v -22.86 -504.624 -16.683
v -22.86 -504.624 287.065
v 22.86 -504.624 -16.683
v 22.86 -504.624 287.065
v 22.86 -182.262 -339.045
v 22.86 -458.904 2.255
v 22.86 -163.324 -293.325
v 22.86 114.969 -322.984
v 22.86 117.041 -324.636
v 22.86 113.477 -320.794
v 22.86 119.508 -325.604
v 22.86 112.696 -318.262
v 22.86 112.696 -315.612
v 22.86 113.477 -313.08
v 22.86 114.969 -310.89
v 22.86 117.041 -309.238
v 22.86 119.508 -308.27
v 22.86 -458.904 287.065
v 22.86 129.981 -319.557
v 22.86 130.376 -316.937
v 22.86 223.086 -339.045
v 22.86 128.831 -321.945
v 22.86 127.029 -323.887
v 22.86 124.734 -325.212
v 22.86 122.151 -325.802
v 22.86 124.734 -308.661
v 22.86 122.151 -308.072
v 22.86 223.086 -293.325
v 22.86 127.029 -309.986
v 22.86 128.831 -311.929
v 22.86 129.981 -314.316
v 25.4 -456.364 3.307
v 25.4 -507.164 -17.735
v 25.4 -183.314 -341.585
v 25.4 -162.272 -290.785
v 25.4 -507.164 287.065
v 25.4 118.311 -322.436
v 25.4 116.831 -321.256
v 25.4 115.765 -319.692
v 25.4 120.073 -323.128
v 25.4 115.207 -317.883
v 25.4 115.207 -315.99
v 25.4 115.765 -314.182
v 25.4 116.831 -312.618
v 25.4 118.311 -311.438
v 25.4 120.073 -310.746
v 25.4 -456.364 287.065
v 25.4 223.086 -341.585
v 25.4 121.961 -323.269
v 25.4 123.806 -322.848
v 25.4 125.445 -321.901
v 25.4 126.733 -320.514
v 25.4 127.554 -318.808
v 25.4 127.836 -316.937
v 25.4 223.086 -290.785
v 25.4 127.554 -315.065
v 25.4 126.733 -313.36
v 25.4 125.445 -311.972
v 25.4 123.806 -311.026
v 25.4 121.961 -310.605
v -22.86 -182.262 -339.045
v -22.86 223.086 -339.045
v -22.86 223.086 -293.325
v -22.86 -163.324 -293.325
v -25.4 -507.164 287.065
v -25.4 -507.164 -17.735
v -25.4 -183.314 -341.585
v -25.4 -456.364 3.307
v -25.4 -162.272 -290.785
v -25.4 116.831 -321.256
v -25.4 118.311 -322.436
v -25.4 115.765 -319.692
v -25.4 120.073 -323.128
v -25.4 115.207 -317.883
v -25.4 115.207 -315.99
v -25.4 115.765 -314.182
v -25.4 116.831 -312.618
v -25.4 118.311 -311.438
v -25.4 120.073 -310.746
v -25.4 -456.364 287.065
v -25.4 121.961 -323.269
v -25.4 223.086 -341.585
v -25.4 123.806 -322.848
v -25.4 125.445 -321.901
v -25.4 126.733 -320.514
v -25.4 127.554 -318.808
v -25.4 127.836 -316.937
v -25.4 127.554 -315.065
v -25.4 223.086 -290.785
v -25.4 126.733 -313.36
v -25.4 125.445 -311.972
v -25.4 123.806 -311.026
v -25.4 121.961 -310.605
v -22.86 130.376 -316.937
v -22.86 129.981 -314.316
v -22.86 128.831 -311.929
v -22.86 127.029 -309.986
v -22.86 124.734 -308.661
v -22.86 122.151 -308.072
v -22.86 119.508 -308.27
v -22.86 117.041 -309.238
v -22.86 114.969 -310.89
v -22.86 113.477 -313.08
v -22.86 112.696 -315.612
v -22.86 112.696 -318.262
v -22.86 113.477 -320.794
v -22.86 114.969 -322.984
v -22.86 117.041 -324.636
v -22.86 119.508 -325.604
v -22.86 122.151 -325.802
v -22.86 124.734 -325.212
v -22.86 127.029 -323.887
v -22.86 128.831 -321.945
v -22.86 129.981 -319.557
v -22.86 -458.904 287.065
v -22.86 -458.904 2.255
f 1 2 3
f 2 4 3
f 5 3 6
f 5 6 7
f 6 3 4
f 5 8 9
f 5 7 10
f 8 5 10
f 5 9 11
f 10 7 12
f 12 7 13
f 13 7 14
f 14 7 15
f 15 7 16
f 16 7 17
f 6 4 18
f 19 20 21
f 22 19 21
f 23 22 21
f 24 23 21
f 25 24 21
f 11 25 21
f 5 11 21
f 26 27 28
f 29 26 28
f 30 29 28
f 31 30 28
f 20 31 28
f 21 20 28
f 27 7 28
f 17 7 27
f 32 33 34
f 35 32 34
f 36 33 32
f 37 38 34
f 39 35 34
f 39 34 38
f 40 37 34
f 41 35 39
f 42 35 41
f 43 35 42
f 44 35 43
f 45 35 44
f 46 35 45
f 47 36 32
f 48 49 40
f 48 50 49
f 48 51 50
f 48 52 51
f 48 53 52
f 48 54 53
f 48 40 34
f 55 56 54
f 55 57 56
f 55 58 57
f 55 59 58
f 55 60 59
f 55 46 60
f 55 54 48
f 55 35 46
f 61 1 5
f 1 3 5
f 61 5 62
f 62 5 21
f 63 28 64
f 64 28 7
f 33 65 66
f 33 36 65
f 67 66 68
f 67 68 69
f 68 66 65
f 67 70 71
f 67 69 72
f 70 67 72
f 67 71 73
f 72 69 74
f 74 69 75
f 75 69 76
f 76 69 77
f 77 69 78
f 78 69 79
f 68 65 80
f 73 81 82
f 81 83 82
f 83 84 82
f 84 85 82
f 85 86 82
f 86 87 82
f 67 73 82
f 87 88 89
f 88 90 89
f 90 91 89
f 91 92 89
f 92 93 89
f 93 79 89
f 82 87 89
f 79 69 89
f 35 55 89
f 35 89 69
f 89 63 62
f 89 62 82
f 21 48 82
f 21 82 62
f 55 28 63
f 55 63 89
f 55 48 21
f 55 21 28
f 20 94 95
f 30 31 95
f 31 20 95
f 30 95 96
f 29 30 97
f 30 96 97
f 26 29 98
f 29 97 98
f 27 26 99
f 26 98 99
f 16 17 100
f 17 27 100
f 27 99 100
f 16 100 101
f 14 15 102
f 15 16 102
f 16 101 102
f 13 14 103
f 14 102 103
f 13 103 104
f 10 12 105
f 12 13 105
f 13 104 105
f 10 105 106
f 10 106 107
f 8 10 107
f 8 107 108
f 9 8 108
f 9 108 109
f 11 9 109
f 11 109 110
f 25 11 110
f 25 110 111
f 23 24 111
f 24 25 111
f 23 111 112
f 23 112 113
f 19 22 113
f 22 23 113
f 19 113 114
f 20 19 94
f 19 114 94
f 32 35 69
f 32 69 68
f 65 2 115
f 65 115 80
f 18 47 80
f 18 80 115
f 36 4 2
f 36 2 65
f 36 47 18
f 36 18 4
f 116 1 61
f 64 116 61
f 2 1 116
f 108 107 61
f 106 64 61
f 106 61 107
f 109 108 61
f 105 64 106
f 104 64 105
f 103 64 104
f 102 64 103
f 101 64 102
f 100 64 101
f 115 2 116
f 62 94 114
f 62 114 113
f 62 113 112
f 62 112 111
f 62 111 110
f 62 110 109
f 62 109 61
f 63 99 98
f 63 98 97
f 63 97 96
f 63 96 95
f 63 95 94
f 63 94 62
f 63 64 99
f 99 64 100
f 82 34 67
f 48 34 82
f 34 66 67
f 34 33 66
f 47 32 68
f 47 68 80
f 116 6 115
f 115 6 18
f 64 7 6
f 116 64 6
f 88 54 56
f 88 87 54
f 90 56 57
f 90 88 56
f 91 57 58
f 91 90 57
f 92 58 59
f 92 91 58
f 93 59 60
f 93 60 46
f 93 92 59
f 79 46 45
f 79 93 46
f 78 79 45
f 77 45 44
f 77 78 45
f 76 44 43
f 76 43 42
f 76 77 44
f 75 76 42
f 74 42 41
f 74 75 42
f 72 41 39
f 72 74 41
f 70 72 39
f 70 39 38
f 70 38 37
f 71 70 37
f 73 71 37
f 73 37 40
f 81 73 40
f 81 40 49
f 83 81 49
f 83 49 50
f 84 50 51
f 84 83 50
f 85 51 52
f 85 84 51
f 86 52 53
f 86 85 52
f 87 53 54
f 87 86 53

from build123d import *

# Parameters (mm, degrees)
F0_R     = 6.35
F1_DEPTH = 25.4
F2_T     = -2.54


with BuildPart() as f1:
    # F0 (on Right) → F1 (new body, symmetric)
    with BuildSketch(Plane.YZ):
        Polygon((-183.3137847563, -341.5853113772), (223.0862152437, -341.5853113772), (223.0862152437, -290.7853113772), (-162.2717357877, -290.7853113772), (-456.3637847563, 3.3067375913), (-456.3637847563, 287.0646886228), (-507.1637847563, 287.0646886228), (-507.1637847563, -17.7353113772), align=None)
        with Locations((121.4862152437, -316.9367909431)):
            Circle(F0_R, mode=Mode.SUBTRACT)
    extrude(amount=F1_DEPTH, both=True)

    # F2
    f2_openings = [f1.faces().sort_by_distance(p)[0] for p in [
        (0, 223.086215, -316.185311),
        (0, -481.763785, 287.064689),
    ]]
    offset(amount=F2_T, openings=f2_openings, kind=Kind.INTERSECTION)


solid = f1.part
